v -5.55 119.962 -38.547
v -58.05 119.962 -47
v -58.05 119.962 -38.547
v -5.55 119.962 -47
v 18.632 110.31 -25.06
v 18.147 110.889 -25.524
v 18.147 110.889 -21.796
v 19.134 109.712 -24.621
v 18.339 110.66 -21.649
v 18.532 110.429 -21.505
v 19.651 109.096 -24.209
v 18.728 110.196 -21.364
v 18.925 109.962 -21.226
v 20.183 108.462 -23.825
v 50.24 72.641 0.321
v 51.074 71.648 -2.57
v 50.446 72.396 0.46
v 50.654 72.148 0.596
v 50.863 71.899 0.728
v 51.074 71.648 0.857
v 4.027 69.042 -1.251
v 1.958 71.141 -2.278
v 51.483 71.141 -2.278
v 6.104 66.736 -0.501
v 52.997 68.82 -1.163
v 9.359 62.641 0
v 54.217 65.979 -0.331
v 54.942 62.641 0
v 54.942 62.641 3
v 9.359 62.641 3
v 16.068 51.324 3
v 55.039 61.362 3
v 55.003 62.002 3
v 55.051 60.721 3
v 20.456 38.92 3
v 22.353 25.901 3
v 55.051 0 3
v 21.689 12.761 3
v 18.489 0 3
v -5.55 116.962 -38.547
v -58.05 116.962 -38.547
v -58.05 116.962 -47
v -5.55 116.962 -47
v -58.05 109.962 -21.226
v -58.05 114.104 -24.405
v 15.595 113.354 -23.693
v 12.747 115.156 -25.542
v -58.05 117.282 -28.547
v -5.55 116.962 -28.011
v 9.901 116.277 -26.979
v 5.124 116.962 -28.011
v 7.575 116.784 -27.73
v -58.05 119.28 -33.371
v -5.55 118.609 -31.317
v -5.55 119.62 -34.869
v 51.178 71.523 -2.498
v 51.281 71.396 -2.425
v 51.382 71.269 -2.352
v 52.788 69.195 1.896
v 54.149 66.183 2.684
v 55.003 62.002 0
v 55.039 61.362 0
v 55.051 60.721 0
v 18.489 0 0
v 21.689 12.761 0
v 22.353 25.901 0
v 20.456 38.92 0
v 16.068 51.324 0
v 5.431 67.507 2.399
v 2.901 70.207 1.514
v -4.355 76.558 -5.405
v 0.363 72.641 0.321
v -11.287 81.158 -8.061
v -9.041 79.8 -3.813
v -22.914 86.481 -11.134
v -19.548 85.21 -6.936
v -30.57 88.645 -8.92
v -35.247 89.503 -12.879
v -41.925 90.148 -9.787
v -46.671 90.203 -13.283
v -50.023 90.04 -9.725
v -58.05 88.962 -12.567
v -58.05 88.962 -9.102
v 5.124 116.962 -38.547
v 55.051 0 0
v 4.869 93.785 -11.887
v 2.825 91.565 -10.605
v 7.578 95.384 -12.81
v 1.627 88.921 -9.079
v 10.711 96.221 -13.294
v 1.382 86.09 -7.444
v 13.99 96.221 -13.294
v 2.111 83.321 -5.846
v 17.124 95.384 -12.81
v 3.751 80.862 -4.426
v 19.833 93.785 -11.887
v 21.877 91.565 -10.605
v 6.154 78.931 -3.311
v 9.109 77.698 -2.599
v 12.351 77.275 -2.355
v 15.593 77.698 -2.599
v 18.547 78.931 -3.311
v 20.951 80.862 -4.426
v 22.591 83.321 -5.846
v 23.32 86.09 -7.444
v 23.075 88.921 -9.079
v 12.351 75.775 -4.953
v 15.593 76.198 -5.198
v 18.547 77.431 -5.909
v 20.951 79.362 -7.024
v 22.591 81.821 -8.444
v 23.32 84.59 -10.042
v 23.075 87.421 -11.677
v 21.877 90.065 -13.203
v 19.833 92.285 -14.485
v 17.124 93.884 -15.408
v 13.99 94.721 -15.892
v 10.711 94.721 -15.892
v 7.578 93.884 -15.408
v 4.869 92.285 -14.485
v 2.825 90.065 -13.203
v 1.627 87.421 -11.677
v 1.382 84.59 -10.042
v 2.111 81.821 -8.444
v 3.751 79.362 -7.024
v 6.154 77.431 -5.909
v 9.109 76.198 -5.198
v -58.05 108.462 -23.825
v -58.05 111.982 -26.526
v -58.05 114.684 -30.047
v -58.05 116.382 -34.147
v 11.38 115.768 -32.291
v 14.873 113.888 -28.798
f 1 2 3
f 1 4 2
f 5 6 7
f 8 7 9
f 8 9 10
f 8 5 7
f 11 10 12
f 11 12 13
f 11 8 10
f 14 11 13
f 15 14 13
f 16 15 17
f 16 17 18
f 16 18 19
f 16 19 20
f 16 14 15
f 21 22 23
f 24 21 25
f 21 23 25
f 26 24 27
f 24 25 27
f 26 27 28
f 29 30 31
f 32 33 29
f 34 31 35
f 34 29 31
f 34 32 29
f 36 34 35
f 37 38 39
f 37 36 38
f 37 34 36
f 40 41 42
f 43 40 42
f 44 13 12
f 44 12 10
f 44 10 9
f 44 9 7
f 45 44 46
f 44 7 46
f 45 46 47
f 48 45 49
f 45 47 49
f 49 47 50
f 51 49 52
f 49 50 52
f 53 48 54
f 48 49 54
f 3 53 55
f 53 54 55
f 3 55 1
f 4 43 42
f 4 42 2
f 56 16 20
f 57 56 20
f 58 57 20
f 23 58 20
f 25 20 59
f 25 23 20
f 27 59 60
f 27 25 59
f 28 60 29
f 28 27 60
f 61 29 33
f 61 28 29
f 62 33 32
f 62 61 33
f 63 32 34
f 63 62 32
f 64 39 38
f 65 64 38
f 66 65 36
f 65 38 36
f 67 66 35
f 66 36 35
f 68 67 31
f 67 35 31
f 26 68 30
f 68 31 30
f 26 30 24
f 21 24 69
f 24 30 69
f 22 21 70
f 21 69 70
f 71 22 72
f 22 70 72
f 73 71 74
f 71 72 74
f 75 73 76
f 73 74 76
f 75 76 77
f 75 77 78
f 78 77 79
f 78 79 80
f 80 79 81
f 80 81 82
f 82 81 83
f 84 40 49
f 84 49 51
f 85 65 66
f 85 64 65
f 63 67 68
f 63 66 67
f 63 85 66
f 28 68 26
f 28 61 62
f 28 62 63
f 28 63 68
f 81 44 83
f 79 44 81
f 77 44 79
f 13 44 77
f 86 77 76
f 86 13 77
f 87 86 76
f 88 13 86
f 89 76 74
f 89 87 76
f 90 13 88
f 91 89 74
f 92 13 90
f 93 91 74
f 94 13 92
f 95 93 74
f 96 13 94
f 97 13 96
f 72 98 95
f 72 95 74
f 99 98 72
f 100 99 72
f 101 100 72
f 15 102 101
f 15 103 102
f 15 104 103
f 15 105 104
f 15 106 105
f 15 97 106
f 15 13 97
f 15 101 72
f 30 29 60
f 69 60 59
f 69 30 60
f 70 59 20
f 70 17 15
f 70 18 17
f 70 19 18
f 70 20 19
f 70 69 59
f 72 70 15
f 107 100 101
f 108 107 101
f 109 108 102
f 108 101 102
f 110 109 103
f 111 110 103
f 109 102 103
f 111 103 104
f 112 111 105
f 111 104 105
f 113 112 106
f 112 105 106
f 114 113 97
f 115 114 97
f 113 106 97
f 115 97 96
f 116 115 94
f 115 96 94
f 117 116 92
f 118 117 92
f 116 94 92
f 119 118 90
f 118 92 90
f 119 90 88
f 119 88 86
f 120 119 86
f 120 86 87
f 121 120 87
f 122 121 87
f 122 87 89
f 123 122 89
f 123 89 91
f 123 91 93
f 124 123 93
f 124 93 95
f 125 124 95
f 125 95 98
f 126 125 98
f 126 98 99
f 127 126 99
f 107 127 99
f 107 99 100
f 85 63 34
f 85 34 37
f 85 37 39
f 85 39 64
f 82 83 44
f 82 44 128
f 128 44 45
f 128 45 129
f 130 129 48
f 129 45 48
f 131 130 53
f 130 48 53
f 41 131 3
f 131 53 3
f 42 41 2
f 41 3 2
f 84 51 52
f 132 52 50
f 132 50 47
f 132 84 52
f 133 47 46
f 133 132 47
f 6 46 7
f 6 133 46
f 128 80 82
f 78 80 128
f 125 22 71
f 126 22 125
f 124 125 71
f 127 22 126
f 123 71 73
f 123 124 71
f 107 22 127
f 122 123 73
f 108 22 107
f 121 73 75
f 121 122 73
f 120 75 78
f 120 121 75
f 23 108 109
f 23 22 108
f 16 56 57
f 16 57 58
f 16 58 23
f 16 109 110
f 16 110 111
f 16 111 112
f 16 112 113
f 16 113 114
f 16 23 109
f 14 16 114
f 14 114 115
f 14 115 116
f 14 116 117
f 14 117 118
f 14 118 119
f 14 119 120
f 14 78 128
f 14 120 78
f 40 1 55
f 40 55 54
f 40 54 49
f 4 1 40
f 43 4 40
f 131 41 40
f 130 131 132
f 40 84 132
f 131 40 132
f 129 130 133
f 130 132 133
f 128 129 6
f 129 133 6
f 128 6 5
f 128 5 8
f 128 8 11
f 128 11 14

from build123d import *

# Parameters (mm, degrees)
SALIENTE_EXTRUIR1_DEPTH = 58.05
REDONDEO1_R             = 20
REDONDEO2_R             = 20
REDONDEO3_R             = 17
REDONDEO4_R             = 17
CAVIDAD1_START          = -47
CAVIDAD1_DEPTH          = 50
CROQUIS16_R             = 67.5
CORTAR_EXTRUIR11_DEPTH  = 143.339628461
CROQUIS18_R             = 11
CORTAR_EXTRUIR12_DEPTH  = 142.06007654


# Read off the part's stored shape, not the designer's step: Cavidad1
with BuildPart() as part:
    # Croquis1 → Saliente-Extruir1 (new, symmetric)
    with BuildSketch(Plane(origin=(0, 0, 0), x_dir=(0, 0, -1), z_dir=(1, 0, 0))):
        Polygon((0, 0), (0, 67.196152423), (28.732050808, 116.961524227), (47, 116.961524227), (47, 119.961524227), (27, 119.961524227), (-3, 68), (-3, 0), align=None)
    extrude(amount=SALIENTE_EXTRUIR1_DEPTH, both=True)

    # Redondeo1
    redondeo1_edges = [part.edges().sort_by_distance(p)[0] for p in [
        (0, 68, 3),
    ]]
    fillet(redondeo1_edges, radius=REDONDEO1_R)

    # Redondeo2
    redondeo2_edges = [part.edges().sort_by_distance(p)[0] for p in [
        (0, 119.961524227, -27),
    ]]
    fillet(redondeo2_edges, radius=REDONDEO2_R)

    # Redondeo3
    redondeo3_edges = [part.edges().sort_by_distance(p)[0] for p in [
        (0, 116.961524227, -28.732050808),
    ]]
    fillet(redondeo3_edges, radius=REDONDEO3_R)

    # Redondeo4
    redondeo4_edges = [part.edges().sort_by_distance(p)[0] for p in [
        (0, 67.196152423, 0),
    ]]
    fillet(redondeo4_edges, radius=REDONDEO4_R)

    # Cavidad1 outline → Cavidad1 (cut)
    with BuildSketch(Plane.XY.offset(CAVIDAD1_START)):
        with BuildLine():
            Line((58.05, 0), (58.05, 119.961524227))
            Line((58.05, 119.961524227), (-5.55, 119.961524227))
            Line((-5.55, 119.961524227), (-5.55, 116.961524227))
            Line((-5.55, 116.961524227), (5.123846837, 116.961524227))
            ThreePointArc((5.123846837, 116.961524227), (12.308357287, 115.368756607), (18.14660237, 110.888913592))
            Line((18.14660237, 110.888913592), (51.073651347, 71.647984679))
            ThreePointArc((51.073651347, 71.647984679), (54.025670368, 66.534937751), (55.050895814, 60.720595315))
            Line((55.050895814, 60.720595315), (55.050895814, 0))
            Line((55.050895814, 0), (58.05, 0))
        make_face()
    extrude(amount=CAVIDAD1_DEPTH, mode=Mode.SUBTRACT)

    # Croquis16 → Cortar-Extruir11 (cut, through all)
    with BuildSketch(Plane.XY.offset(3)):
        with Locations((-45.071920691, 22.721524227)):
            Circle(CROQUIS16_R)
    extrude(amount=-CORTAR_EXTRUIR11_DEPTH, mode=Mode.SUBTRACT)

    # Croquis18 → Cortar-Extruir12 (cut, through all)
    with BuildSketch(Plane(origin=(0, 18.299038106, 31.694863729), x_dir=(1, 0, 0), z_dir=(0, 0.4999999999999976, 0.86602540378444))):
        with Locations(Location((12.350895814, 79.099876042, 0), (0, 0, 270))):
            Circle(CROQUIS18_R)
    extrude(amount=-CORTAR_EXTRUIR12_DEPTH, mode=Mode.SUBTRACT)


solid = part.part
